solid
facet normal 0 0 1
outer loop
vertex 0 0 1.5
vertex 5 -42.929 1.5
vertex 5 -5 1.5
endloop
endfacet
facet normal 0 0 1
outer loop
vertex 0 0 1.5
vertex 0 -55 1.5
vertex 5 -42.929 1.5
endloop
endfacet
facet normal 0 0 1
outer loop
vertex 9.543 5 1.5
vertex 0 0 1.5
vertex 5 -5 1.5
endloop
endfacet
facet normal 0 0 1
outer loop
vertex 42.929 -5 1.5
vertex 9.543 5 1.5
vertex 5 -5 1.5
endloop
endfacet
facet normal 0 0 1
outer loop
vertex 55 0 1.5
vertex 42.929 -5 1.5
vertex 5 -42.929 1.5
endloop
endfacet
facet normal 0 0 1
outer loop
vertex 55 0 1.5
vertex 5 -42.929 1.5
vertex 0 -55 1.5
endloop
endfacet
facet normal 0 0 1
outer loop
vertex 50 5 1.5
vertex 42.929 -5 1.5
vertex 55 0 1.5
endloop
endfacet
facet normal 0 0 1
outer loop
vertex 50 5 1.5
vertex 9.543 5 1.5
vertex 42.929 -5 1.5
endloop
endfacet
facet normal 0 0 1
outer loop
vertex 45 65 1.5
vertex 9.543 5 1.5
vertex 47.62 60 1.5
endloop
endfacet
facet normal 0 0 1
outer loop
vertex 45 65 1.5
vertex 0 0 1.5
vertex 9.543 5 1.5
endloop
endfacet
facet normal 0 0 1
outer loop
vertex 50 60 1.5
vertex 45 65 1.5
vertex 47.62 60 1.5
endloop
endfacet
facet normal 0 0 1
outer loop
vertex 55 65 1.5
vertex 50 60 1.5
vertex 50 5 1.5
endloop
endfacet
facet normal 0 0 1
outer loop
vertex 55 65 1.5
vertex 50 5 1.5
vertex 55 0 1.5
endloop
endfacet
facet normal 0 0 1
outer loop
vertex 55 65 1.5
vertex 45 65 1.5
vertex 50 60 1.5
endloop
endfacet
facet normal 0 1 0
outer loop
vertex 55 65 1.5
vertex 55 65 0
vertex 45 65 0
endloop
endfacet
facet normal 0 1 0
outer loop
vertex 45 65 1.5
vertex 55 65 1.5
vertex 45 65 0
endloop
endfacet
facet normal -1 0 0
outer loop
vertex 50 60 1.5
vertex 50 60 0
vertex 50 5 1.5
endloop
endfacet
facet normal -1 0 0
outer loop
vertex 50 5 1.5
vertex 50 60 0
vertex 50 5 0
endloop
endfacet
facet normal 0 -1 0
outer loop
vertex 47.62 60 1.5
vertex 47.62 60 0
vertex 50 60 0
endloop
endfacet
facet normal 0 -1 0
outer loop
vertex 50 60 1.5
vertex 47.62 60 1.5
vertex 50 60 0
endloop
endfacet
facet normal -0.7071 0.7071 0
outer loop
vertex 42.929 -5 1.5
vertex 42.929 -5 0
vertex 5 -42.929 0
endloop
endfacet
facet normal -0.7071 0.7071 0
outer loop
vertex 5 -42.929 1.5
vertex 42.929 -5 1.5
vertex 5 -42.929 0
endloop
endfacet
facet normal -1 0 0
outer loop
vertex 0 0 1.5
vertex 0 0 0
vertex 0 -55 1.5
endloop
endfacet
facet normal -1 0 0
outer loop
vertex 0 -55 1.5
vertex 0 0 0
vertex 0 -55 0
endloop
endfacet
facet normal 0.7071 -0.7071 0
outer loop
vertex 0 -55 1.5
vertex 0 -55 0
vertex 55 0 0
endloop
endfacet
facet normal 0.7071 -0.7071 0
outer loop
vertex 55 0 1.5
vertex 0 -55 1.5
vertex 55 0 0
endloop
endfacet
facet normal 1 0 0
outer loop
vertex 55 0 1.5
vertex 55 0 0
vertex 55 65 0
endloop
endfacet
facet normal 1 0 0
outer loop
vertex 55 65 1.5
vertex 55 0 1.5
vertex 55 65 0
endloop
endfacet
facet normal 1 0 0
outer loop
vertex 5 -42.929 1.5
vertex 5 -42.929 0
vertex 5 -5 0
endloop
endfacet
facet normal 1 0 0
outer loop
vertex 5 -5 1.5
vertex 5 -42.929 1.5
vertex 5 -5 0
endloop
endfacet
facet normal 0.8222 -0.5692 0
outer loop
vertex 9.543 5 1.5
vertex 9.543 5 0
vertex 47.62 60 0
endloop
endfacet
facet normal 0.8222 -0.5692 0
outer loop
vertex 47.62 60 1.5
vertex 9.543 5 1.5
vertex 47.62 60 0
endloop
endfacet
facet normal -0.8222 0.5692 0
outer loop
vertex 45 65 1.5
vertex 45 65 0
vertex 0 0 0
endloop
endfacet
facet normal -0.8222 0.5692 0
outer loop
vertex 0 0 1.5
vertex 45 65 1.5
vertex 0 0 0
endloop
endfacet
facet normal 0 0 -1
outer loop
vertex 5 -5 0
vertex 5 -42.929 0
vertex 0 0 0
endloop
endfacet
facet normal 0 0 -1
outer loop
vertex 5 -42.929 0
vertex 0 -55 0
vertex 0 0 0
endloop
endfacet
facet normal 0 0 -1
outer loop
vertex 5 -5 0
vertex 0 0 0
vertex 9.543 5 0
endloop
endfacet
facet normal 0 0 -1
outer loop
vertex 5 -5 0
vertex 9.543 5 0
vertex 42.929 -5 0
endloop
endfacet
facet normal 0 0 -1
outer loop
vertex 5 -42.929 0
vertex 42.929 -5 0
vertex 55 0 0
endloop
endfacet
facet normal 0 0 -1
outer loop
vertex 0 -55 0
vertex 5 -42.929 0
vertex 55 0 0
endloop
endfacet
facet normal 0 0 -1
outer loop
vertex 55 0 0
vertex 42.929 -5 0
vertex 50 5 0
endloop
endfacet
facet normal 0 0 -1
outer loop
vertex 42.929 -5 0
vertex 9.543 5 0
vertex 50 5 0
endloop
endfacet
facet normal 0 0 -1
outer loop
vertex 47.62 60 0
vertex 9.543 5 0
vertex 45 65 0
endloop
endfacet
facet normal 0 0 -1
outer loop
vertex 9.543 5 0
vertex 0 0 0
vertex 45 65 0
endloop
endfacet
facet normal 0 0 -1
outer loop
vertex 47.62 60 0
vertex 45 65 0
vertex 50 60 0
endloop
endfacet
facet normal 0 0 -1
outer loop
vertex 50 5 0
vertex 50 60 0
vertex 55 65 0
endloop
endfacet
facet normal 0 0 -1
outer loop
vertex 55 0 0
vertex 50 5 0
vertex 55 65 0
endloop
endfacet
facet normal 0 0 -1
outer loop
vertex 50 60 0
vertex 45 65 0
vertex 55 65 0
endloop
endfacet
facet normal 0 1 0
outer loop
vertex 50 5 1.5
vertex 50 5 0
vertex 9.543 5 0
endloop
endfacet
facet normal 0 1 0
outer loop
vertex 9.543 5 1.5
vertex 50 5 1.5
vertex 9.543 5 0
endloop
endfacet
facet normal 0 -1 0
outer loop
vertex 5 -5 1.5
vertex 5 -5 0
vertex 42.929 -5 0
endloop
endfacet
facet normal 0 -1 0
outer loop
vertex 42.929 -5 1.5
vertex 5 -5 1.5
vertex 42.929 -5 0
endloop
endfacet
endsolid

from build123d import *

# Parameters (mm, degrees)
F1_DEPTH = 1.5


with BuildPart() as f1:
    # F0 (on Top) → F1 (new body)
    with BuildSketch(Plane.XY):
        Polygon((45, 65), (0, 0), (55, 0), (55, 65), align=None)
        Polygon((9.542842, 5), (47.619765, 60), (50, 60), (50, 5), align=None, mode=Mode.SUBTRACT)
        Polygon((55, 0), (0, 0), (0, -55), align=None)
        Polygon((5, -42.928932), (5, -5), (42.928932, -5), align=None, mode=Mode.SUBTRACT)
    extrude(amount=F1_DEPTH)


solid = f1.part
